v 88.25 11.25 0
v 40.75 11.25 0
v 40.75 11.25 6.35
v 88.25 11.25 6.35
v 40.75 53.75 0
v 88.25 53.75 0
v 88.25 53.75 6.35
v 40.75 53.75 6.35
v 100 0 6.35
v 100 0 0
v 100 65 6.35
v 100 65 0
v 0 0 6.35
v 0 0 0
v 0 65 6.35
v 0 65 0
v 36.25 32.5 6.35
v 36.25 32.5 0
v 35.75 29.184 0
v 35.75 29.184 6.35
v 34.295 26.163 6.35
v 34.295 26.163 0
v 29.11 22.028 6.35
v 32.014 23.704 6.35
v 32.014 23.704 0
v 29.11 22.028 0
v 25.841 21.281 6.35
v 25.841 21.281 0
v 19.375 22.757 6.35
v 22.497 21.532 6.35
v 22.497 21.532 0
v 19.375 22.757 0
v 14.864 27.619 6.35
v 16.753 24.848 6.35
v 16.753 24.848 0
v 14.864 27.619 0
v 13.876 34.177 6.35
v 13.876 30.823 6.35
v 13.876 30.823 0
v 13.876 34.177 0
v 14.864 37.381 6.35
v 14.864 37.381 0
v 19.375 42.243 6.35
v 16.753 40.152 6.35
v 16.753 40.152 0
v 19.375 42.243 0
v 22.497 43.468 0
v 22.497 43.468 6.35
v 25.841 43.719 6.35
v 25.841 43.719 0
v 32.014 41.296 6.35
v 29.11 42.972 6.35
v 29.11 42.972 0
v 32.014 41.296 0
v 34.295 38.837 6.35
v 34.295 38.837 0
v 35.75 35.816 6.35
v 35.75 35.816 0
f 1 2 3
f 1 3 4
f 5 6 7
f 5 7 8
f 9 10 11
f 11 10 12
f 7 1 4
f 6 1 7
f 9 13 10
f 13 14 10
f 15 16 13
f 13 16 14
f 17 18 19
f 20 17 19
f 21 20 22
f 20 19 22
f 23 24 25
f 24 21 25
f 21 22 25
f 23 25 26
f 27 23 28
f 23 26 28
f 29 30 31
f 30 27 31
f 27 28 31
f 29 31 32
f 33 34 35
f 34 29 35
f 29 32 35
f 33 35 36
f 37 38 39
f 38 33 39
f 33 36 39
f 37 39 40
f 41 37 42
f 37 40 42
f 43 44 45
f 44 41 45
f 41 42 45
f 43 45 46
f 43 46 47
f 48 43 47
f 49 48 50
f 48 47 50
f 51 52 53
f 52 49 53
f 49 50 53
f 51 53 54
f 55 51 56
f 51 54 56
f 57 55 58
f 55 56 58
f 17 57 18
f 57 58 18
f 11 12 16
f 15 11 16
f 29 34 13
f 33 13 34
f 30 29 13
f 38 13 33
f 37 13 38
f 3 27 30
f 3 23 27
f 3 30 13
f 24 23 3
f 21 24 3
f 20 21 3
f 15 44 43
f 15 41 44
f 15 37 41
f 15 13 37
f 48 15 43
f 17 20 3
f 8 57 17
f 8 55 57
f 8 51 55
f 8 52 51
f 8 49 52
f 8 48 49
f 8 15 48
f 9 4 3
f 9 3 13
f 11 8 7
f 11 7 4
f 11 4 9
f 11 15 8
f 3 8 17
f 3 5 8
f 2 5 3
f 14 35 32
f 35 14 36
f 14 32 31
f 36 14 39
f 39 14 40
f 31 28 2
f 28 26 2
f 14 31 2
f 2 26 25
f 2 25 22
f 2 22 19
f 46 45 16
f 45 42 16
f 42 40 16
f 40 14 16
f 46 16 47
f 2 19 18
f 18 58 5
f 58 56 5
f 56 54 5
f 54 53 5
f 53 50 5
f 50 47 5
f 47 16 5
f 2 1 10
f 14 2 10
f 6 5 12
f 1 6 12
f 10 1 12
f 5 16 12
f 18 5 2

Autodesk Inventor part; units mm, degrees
ref_plane "YZ Plane" through (0, 0, 0) normal (1, 0, 0) x (0, 1, 0)
ref_plane "XZ Plane" through (0, 0, 0) normal (0, 1, 0) x (-1, 0, 0)
ref_plane "XY Plane" through (0, 0, 0) normal (0, 0, 1) x (1, 0, 0)
sketch "Sketch1" plane through (0, 0, 0) normal (0, 0, 1) x (1, 0, 0)
  line L0 (0, 0) -> (100, 0)
  line L1 (100, 0) -> (100, 65)
  line L2 (100, 65) -> (0, 65)
  line L3 (0, 65) -> (0, 0)
  line L4 (88.25, 53.75) -> (40.75, 53.75)
  line L5 (40.75, 53.75) -> (40.75, 11.25)
  line L6 (40.75, 11.25) -> (88.25, 11.25)
  line L7 (88.25, 11.25) -> (88.25, 53.75)
  circle A0 centre (25, 32.5) radius 11.25
  point P0 (88.25, 32.5)
  point P1 (100, 32.5)
  point P2 (64.5, 53.75)
  dimension "d0" = 65
  dimension "d1" = 100
  dimension "d2" = 47.5
  dimension "d3" = 42.5
  dimension "d4" = 35.5
  dimension "d5" = 75
  dimension "d6" = 22.5
extrude "Extrusion1" add sketch "Sketch1" along normal blind 6.35
equation "\"d7\" = THICKB"
equation "\"THICKA\" = 3.175"
equation "\"THICKB\" = 6.35"
equation "\"THICKC\" = 12.7"
properties part number "WoodD_Extruder_Side_Hole"
